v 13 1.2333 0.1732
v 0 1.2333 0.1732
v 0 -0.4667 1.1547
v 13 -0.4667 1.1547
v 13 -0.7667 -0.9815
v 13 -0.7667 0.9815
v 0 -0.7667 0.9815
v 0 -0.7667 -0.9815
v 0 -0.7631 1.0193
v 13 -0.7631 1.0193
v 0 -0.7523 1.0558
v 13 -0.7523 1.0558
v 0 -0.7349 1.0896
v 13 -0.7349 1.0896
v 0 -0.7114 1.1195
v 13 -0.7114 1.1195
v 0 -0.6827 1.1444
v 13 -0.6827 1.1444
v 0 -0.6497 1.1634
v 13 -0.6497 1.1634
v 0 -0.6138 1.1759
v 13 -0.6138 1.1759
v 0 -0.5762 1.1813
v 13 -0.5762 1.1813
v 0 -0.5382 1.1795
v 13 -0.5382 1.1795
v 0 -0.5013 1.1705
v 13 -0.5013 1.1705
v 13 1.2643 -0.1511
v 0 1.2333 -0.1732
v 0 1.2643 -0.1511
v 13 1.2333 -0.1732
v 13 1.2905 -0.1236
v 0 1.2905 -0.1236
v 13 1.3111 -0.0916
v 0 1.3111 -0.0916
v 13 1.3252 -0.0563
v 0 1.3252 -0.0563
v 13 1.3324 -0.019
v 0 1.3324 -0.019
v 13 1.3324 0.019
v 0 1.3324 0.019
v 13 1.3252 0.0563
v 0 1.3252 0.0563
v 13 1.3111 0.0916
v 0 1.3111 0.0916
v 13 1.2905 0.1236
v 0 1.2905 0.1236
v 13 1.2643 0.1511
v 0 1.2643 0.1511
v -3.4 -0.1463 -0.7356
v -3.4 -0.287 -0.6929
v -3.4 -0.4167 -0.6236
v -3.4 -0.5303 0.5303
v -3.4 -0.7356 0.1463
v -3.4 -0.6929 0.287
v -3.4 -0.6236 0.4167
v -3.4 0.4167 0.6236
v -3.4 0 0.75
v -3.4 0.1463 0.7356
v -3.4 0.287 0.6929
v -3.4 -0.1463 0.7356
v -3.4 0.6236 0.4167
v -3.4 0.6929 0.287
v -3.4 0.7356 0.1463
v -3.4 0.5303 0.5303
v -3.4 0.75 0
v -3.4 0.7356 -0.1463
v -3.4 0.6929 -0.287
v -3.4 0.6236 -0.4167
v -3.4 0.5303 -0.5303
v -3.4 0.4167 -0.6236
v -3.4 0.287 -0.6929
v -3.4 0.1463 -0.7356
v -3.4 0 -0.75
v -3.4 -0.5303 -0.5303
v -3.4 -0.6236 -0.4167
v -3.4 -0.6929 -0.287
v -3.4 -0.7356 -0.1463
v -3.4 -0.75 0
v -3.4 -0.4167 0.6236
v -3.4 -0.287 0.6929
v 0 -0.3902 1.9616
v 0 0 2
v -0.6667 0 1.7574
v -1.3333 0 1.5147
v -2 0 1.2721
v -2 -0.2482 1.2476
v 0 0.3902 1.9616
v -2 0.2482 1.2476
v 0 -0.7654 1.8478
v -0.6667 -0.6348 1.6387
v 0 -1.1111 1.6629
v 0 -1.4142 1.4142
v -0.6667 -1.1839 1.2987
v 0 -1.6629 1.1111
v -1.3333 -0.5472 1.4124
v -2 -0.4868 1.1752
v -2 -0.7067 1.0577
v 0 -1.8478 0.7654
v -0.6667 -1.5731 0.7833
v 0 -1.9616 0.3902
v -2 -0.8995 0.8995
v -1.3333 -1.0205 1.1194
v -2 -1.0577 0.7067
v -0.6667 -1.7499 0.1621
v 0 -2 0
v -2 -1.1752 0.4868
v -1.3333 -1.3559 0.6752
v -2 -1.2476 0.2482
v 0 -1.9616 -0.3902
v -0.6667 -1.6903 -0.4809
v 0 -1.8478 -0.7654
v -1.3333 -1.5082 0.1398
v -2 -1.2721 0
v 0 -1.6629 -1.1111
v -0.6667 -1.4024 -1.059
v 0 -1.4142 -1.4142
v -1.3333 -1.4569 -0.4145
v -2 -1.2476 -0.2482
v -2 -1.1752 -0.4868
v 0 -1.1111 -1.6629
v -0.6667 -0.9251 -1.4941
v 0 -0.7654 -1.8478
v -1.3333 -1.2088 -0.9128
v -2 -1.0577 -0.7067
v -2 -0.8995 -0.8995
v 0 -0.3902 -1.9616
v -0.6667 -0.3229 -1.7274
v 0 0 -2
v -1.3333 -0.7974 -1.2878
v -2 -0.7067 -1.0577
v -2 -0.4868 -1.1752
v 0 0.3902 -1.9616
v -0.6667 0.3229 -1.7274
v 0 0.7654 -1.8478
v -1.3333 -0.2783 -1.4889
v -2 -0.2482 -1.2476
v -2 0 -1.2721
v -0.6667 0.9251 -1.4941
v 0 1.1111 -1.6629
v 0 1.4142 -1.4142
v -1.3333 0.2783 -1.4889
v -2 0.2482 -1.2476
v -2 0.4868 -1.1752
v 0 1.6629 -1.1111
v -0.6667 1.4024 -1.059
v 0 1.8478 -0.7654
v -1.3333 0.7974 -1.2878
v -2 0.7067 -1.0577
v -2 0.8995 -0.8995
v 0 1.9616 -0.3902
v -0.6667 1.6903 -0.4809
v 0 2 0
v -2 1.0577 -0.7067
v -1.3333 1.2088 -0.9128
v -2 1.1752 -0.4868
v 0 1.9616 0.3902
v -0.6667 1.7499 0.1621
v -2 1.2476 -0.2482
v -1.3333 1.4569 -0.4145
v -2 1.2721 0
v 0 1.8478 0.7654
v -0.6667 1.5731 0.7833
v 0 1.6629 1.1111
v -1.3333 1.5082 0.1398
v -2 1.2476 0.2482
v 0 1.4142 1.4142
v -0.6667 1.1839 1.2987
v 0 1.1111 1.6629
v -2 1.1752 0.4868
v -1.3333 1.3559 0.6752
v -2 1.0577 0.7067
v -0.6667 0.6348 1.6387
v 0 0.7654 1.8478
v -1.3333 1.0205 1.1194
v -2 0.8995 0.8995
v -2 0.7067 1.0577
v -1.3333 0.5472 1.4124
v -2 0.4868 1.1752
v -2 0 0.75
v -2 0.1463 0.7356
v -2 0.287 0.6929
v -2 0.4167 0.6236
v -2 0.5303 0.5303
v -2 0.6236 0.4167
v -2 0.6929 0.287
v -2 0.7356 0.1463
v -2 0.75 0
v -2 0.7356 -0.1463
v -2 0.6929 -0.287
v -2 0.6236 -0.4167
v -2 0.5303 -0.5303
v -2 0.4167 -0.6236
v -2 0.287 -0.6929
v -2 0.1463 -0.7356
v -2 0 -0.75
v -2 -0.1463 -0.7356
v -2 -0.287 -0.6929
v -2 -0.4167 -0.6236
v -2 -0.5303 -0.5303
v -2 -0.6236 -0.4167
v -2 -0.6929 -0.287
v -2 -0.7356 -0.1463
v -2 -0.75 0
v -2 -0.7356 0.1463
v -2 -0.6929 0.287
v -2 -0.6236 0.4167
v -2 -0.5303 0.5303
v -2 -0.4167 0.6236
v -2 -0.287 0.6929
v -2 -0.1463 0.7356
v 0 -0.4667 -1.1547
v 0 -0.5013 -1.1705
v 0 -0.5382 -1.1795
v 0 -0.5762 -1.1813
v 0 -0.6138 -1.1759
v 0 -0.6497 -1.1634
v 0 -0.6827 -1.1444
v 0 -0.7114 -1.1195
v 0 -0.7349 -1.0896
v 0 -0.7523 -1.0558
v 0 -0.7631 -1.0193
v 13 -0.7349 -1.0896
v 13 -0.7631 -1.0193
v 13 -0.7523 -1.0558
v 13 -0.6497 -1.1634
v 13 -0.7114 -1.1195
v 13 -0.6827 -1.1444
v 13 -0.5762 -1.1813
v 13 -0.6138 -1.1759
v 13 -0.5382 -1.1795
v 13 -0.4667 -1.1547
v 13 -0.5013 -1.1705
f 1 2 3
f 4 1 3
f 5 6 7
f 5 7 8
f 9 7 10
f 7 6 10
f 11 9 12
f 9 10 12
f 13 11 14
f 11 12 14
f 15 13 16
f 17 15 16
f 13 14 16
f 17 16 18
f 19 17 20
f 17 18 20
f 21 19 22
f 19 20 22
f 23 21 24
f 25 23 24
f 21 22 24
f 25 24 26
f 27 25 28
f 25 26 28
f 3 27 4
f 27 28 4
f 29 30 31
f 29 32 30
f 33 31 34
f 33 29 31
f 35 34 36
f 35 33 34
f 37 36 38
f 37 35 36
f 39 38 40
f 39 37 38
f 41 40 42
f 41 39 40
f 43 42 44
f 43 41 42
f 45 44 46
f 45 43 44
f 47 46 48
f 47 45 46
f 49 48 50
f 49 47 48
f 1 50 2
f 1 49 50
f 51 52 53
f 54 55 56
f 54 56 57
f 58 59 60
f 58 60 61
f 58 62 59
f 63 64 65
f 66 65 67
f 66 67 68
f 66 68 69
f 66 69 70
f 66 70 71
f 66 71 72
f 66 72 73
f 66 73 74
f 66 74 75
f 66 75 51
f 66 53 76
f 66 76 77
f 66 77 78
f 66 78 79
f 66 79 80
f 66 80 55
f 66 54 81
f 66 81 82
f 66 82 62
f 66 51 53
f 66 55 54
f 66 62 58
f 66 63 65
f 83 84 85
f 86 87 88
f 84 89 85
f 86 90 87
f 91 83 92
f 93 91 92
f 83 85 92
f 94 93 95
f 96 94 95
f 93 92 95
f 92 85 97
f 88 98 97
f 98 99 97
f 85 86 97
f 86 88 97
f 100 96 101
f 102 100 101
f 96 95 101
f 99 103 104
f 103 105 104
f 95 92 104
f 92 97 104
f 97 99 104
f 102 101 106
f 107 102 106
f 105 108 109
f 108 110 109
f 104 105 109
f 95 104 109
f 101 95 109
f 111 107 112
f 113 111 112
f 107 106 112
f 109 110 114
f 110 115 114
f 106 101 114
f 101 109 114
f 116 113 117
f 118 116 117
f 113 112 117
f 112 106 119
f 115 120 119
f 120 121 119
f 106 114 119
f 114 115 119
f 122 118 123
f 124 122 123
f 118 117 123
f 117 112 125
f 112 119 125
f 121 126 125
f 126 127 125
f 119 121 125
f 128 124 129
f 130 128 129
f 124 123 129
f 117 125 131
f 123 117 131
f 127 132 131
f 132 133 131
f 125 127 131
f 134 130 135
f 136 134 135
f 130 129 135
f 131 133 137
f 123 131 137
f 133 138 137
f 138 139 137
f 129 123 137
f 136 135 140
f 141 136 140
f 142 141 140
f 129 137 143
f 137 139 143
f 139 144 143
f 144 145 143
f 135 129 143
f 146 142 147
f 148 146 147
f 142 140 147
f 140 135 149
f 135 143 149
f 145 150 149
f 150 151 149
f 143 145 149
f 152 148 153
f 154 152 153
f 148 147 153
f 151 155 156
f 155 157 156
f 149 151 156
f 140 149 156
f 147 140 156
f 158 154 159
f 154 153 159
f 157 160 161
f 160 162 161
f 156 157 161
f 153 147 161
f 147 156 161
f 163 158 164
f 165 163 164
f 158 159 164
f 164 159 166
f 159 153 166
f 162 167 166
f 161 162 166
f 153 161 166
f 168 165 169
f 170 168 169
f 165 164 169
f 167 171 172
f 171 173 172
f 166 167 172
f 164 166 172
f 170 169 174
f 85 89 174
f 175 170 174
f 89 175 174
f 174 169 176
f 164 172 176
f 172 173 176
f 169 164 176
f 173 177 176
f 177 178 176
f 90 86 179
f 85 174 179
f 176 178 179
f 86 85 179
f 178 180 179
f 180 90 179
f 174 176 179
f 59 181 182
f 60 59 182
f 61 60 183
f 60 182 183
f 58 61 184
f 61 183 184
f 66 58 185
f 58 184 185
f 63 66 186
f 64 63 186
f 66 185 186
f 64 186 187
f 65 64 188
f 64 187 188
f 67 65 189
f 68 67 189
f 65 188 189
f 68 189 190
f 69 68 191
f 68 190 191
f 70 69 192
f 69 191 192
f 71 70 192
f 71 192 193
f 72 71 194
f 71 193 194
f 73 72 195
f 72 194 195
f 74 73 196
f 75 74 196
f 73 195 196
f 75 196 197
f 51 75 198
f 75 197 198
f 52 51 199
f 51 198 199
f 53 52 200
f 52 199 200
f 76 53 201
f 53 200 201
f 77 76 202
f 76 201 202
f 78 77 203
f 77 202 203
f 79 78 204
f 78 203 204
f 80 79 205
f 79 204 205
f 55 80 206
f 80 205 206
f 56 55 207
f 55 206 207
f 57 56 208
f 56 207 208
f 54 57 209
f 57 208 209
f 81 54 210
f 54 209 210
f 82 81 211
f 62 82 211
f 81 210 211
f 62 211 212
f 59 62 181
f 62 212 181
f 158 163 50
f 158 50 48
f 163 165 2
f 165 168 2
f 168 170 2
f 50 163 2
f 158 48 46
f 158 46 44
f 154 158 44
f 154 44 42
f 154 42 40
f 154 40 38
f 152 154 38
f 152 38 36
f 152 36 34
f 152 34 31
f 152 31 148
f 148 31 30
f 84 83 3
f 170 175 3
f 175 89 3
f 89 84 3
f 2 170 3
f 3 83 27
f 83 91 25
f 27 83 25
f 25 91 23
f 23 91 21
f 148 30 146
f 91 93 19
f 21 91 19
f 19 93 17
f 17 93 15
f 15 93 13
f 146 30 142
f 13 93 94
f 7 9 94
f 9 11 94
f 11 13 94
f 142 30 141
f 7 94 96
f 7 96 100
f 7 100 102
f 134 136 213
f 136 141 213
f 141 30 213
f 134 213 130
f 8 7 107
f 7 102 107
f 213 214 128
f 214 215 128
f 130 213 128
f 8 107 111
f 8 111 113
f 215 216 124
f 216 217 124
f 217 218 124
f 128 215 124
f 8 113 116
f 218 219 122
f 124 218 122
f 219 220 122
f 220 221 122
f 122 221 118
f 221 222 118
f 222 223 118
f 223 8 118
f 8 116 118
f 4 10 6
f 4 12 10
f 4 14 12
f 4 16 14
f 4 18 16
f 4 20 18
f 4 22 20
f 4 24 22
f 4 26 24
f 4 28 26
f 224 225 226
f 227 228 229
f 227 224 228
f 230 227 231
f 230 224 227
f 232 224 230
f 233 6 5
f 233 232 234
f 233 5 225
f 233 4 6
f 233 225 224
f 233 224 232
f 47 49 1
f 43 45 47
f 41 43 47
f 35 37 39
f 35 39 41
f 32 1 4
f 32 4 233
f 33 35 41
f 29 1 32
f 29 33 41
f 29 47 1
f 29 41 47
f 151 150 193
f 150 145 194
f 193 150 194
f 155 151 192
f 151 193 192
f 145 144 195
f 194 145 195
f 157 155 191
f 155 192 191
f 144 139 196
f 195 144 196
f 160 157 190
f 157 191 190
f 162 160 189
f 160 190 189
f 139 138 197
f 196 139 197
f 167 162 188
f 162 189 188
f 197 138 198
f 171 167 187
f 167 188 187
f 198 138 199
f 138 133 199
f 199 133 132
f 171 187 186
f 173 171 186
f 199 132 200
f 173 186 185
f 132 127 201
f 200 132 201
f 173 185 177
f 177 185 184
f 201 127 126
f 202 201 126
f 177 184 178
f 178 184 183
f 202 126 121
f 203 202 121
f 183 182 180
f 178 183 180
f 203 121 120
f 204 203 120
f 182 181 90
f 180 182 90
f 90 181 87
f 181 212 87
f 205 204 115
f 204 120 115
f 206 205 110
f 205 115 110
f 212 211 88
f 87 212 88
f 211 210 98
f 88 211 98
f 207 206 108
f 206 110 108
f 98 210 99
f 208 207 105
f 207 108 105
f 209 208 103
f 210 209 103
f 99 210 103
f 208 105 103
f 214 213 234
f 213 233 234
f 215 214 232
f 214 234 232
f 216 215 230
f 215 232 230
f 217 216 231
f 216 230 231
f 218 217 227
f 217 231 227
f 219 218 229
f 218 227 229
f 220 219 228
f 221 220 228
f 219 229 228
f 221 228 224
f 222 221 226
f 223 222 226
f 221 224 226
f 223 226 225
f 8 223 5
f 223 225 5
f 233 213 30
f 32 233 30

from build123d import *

# Parameters (mm, degrees)
BOSS_EXTRUDE1_DEPTH = 13
SKETCH3_R           = 0.75
BOSS_EXTRUDE2_DEPTH = 1.4
FILLET1_R           = 0.2


with BuildPart() as part:
    # Sketch1 → Revolve1 (revolve)
    with BuildSketch(Plane.XY, mode=Mode.PRIVATE) as revolve1_sk:
        Polygon((0, 0), (0, 2), (-2, 1.272059531), (-2, 0), align=None)
    revolve(revolve1_sk.sketch.rotate(Axis((-2, 0, 0), (1, 0, 0)), 90), axis=Axis((-2, 0, 0), (1, 0, 0)))

    # Sketch2 → Boss-Extrude1 (add)
    with BuildSketch(Plane(origin=(0, 0, 0), x_dir=(0, 0, -1), z_dir=(1, 0, 0))):
        Polygon((0, 1.533333333), (-1.327905619, -0.766666667), (1.327905619, -0.766666667), align=None)
    extrude(amount=BOSS_EXTRUDE1_DEPTH)

    # Sketch3 → Boss-Extrude2 (add)
    with BuildSketch(Plane.ZY.offset(2)):
        Circle(SKETCH3_R)
    extrude(amount=BOSS_EXTRUDE2_DEPTH)

    # Fillet1
    fillet1_edges = [part.edges().sort_by_distance(p)[0] for p in [
        (6.5, -0.766666667, -1.327905619),
        (6.5, 1.533333333, 0),
        (6.5, -0.766666667, 1.327905619),
    ]]
    fillet(fillet1_edges, radius=FILLET1_R)


solid = part.part
